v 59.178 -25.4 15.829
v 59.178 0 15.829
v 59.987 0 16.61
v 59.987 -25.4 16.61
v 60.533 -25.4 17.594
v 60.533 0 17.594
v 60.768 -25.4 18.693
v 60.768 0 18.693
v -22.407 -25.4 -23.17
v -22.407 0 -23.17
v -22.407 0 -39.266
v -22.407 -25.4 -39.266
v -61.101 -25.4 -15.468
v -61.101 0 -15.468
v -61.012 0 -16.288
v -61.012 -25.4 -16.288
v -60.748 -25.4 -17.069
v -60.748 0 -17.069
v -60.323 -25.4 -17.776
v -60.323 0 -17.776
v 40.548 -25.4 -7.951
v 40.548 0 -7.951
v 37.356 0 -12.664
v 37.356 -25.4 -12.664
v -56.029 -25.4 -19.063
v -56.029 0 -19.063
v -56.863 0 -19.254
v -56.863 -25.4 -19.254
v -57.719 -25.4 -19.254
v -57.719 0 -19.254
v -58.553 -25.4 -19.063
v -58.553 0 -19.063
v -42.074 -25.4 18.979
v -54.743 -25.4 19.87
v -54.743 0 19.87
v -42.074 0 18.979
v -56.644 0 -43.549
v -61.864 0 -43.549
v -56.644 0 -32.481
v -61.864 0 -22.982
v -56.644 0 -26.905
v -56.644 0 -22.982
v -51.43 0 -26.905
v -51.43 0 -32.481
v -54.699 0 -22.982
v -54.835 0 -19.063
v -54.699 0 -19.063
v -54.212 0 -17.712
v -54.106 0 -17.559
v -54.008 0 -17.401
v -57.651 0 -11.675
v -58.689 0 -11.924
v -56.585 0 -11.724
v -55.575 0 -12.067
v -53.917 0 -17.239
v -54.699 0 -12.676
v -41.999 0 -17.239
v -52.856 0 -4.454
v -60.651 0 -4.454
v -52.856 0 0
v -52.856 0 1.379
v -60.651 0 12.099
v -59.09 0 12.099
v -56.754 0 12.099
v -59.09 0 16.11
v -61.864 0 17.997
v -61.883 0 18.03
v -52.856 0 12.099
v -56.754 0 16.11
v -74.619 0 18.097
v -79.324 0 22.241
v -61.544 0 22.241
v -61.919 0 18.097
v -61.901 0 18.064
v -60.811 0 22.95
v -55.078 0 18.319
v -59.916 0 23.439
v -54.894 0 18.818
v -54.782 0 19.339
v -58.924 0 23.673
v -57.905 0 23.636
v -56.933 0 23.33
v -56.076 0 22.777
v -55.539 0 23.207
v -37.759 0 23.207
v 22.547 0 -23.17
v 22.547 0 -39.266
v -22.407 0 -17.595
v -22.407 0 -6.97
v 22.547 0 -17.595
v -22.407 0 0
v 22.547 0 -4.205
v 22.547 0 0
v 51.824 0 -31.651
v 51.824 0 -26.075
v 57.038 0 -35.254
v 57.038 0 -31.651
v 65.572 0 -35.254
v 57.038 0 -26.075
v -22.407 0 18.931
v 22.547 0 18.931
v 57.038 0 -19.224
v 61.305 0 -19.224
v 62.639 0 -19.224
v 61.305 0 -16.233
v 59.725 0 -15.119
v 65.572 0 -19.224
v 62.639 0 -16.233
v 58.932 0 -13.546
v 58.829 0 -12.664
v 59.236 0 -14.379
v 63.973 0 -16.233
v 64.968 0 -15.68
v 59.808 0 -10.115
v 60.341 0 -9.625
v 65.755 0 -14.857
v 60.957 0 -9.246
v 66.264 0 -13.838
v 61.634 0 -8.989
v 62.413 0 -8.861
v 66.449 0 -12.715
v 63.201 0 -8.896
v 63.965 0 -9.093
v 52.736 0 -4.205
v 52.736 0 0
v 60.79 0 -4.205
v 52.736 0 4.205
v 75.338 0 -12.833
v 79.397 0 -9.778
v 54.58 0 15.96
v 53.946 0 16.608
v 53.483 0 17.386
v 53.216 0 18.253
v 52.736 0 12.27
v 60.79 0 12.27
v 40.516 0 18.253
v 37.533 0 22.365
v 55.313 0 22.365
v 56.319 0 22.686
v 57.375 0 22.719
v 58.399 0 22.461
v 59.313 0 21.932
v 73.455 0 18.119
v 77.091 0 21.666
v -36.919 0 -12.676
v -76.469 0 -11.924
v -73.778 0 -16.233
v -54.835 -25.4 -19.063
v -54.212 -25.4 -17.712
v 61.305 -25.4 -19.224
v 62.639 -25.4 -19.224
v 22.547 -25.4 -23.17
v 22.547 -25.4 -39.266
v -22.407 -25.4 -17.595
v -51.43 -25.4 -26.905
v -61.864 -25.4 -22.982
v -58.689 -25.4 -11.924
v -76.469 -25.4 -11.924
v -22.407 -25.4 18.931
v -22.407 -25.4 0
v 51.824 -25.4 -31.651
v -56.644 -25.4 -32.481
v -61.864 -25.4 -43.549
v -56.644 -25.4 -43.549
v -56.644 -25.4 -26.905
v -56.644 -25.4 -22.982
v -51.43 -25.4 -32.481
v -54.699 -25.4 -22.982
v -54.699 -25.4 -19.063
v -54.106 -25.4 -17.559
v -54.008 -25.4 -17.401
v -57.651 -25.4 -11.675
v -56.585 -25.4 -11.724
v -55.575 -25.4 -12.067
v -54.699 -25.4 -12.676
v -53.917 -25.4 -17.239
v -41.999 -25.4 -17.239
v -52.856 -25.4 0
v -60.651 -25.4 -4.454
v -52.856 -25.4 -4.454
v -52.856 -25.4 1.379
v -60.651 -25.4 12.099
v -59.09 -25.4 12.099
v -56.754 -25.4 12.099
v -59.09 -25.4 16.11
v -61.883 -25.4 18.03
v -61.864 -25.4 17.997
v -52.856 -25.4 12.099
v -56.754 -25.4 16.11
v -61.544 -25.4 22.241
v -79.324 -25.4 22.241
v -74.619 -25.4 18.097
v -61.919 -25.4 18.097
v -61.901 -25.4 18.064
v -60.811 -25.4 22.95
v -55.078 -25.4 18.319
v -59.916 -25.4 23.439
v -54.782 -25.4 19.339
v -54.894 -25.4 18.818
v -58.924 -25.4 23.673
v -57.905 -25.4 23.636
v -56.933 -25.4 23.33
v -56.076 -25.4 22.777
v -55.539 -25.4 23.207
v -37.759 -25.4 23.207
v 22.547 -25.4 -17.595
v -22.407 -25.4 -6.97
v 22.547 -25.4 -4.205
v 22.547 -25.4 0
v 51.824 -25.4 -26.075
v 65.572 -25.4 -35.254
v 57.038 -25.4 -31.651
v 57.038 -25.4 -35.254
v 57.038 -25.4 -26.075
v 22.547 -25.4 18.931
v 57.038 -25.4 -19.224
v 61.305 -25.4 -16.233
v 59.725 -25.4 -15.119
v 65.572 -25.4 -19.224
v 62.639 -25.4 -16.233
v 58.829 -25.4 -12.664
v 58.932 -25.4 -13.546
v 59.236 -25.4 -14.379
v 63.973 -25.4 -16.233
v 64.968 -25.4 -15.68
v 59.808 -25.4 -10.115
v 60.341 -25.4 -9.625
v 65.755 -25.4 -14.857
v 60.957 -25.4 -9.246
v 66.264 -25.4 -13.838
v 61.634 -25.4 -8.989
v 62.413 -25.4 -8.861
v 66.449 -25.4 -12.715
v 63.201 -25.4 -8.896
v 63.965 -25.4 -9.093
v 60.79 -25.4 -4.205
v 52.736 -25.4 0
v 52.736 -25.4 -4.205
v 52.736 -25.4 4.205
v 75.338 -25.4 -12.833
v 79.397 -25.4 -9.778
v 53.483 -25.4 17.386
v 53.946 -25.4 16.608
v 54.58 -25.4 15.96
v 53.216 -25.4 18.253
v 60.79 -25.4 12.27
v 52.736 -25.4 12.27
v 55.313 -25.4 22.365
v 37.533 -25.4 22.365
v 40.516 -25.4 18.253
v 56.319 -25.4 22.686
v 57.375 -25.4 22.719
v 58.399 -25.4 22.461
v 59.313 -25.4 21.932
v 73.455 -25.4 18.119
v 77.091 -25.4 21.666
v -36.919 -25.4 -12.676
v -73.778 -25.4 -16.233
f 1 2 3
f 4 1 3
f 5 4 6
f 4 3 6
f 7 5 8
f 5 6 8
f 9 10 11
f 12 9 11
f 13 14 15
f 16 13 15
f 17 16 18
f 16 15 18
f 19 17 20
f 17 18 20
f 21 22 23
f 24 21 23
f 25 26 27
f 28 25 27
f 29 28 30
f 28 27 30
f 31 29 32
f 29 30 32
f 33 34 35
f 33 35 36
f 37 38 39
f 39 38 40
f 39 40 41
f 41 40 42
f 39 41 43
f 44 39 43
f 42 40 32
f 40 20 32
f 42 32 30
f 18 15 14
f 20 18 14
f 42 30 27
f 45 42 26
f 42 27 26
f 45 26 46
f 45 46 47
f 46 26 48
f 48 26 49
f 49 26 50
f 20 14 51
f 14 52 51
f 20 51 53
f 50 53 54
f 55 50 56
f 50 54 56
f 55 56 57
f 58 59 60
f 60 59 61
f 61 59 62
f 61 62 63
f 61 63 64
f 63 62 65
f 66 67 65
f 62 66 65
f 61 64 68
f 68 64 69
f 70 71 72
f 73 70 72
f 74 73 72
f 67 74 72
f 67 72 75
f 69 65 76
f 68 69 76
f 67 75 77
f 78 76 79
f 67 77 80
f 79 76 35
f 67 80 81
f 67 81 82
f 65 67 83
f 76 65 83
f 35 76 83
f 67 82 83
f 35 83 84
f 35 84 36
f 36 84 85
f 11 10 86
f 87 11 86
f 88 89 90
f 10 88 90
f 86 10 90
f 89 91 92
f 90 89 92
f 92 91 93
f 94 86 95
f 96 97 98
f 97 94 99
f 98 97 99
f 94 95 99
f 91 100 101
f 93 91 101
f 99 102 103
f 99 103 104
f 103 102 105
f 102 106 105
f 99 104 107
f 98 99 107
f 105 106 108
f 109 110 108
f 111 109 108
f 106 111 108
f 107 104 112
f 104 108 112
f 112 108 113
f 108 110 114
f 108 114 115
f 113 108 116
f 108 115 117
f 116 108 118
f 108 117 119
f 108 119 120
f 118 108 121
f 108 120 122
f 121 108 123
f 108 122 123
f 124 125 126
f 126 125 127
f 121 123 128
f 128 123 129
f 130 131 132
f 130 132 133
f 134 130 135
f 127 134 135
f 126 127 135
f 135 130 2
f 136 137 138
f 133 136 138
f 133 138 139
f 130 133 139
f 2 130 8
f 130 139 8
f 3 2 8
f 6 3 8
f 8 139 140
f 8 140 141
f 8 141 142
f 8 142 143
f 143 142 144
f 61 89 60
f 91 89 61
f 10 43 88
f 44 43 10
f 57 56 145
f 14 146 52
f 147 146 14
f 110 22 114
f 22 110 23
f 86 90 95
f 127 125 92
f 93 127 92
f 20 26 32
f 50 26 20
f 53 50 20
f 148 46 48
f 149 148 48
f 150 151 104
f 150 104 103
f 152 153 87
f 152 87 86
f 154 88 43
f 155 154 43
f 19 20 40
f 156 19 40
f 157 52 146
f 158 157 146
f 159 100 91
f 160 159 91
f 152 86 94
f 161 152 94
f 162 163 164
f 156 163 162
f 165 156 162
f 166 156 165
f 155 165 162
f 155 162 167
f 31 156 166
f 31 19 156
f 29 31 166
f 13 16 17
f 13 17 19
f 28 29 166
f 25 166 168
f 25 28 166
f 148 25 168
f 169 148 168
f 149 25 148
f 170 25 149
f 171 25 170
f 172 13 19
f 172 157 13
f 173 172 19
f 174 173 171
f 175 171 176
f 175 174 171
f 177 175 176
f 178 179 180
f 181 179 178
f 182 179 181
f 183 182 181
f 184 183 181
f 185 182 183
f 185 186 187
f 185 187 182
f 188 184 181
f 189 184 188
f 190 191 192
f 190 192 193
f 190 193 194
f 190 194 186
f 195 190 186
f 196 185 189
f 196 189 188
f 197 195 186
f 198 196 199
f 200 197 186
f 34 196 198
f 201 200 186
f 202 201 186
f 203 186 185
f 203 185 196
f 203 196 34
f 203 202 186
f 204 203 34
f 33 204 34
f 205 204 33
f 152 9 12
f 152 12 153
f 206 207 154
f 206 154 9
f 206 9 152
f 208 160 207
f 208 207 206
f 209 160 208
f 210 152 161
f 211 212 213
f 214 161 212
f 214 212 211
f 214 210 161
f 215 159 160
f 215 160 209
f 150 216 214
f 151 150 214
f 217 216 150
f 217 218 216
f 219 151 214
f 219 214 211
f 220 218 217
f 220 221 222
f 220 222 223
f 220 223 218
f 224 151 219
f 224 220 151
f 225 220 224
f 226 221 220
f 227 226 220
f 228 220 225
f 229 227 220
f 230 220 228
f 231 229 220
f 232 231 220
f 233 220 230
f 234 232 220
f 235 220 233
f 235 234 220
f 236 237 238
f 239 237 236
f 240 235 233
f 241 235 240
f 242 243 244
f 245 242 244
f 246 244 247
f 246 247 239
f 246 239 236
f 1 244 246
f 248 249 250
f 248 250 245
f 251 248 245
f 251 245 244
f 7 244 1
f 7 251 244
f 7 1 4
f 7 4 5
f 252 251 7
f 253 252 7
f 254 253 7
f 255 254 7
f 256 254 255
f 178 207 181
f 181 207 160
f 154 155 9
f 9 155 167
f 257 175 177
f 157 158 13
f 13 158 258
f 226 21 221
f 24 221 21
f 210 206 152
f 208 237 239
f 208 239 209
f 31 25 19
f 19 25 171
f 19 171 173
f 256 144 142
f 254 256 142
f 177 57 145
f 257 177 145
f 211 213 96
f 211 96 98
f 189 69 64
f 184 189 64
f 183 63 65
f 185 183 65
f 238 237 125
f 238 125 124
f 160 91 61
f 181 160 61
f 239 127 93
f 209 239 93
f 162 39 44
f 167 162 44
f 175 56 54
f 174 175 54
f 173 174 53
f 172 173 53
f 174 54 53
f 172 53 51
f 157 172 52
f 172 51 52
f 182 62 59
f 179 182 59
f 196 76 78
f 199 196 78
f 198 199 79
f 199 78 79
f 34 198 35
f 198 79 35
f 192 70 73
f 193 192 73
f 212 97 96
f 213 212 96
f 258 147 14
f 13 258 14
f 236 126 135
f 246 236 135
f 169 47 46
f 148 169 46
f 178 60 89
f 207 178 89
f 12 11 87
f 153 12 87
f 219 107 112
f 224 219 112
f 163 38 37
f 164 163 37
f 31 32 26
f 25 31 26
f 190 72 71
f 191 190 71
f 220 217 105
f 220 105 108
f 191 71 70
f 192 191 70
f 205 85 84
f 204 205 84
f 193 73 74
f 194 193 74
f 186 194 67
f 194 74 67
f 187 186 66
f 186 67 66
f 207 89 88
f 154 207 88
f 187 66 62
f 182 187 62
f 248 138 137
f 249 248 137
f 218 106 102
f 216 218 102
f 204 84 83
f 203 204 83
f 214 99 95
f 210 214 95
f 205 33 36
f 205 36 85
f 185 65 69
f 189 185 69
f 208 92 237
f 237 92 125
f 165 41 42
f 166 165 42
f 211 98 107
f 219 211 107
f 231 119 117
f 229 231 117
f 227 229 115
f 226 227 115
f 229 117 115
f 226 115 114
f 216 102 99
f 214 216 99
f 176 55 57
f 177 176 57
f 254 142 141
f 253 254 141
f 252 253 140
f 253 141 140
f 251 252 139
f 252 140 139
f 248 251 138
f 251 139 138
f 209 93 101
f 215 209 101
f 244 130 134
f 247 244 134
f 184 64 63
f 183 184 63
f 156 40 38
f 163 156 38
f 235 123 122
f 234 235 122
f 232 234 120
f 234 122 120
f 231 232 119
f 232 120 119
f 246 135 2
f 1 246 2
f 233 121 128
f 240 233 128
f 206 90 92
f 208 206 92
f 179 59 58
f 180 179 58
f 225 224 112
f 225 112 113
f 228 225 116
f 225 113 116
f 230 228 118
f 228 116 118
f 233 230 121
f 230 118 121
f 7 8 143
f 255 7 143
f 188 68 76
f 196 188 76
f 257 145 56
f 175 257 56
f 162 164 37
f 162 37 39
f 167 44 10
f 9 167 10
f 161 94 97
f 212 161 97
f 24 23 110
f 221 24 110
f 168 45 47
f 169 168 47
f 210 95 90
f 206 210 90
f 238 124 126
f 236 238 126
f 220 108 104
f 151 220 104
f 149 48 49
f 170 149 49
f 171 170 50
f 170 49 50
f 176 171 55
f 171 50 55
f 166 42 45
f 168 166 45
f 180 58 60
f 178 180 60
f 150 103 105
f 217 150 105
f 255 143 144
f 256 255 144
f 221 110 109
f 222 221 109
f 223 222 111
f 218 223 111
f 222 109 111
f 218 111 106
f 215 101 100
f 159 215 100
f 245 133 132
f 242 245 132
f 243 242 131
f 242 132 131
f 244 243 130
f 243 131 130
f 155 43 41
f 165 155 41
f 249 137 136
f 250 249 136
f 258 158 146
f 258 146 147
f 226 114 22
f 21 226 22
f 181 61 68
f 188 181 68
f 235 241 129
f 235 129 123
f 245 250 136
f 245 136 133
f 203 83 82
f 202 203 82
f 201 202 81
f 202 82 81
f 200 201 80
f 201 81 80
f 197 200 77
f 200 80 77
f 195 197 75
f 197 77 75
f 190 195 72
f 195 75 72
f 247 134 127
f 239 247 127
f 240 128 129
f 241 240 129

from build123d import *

# Parameters (mm, degrees)
F1_DEPTH = 25.4


with BuildPart() as f1:
    # F0 (on Front) → F1 (new body)
    with BuildSketch(Plane.XZ):
        Polygon((22.5474490715, 18.9312816523), (-22.4071055408, 18.9312816523), (-22.4071055408, 0), (-22.4071055408, -6.9696964332), (-22.4071055408, -17.594622799), (-22.4071055408, -23.1704941269), (-22.4071055408, -39.2656994748), (22.5474490715, -39.2656994748), (22.5474490715, -23.1704941269), (22.5474490715, -17.594622799), (22.5474490715, -4.2047654179), (22.5474490715, 0), align=None)
        Polygon((-22.4071055408, -6.9696964332), (-22.4071055408, 0), (-52.8559159213, 1.3785305276), (-52.8559159213, 12.0989607125), (-56.7535475108, 12.0989607125), (-59.089986937, 12.0989607125), (-60.6511791004, 12.0989607125), (-60.6511791004, 1.3785305276), (-60.6511791004, -4.4540729796), (-52.8559159213, -4.4540729796), (-52.8559159213, 0), align=None)
        Polygon((52.7360288291, 4.2047654179), (22.5474490715, 0), (22.5474490715, -4.2047654179), (52.7360288291, 0), (52.7360288291, -4.2047654179), (60.7895958687, -4.2047654179), (60.7895958687, 12.2697306797), (59.0926311994, 12.2697306797), (56.7628123489, 12.2697306797), (52.7360288291, 12.2697306797), align=None)
        Polygon((-22.4071055408, -23.1704941269), (-22.4071055408, -17.594622799), (-51.4301823175, -26.9054452341), (-56.6440403175, -26.9054452341), (-56.6440403175, -22.9819128912), (-58.5528229446, -22.9819128912), (-61.8640467567, -22.9819128912), (-61.8640467567, -43.5494654834), (-56.6440403175, -43.5494654834), (-56.6440403175, -32.481316562), (-51.4301823175, -32.481316562), align=None)
        with BuildLine():
            Line((-56.7535475108, 12.0989607125), (-52.8559159213, 12.0989607125))
            Line((-52.8559159213, 12.0989607125), (-55.078114397, 18.3186511549))
            ThreePointArc((-55.078114397, 18.3186511549), (-56.262887732, 16.8364566613), (-58.0156589521, 16.1095581661))
            Line((-58.0156589521, 16.1095581661), (-56.7535475108, 16.1095581661))
            Line((-56.7535475108, 16.1095581661), (-56.7535475108, 12.0989607125))
        make_face()
        Polygon((51.8240314995, -26.0747242923), (22.5474490715, -17.594622799), (22.5474490715, -23.1704941269), (51.8240314995, -31.6505956202), (57.037895267, -31.6505956202), (57.037895267, -35.2540606945), (65.5718660751, -35.2540606945), (65.5718660751, -19.2238938555), (62.6388617216, -19.2238938555), (61.3048806711, -19.2238938555), (57.037895267, -19.2238938555), (57.037895267, -26.0747242923), align=None)
        with BuildLine():
            Line((54.5799710571, 15.960324229), (52.7360288291, 12.2697306797))
            Line((52.7360288291, 12.2697306797), (56.7628123489, 12.2697306797))
            Line((56.7628123489, 12.2697306797), (59.0926311994, 12.2697306797))
            Line((59.0926311994, 12.2697306797), (60.7895958687, 12.2697306797))
            Line((60.7895958687, 12.2697306797), (59.1775793711, 15.8294018559))
            ThreePointArc((59.1775793711, 15.8294018559), (56.8567905245, 15.1228254655), (54.5799710571, 15.960324229))
        make_face()
        with BuildLine():
            Line((-54.7428394485, 19.8702869995), (-55.078114397, 18.3186511549))
            ThreePointArc((-55.078114397, 18.3186511549), (-54.8287689719, 19.0768137561), (-54.7428394485, 19.8702869995))
        make_face()
        with BuildLine():
            ThreePointArc((-58.0156589521, 16.1095581661), (-56.262887732, 16.8364566613), (-55.078114397, 18.3186511549))
            Line((-55.078114397, 18.3186511549), (-54.7428394485, 19.8702869995))
            ThreePointArc((-54.7428394485, 19.8702869995), (-54.7428270706, 19.8758941331), (-54.7428229446, 19.8815012788))
            ThreePointArc((-54.7428229446, 19.8815012788), (-55.0921436229, 21.4751758479), (-56.0760505732, 22.7766176184))
            Line((-56.0760505732, 22.7766176184), (-61.919152939, 18.0971463901))
            ThreePointArc((-61.919152939, 18.0971463901), (-61.8919764107, 18.0467930924), (-61.8640467567, 17.9968536019))
            ThreePointArc((-61.8640467567, 17.9968536019), (-60.6959499098, 16.7314049611), (-59.089986937, 16.1095581661))
            Line((-59.089986937, 16.1095581661), (-58.0156589521, 16.1095581661))
        make_face()
        with BuildLine():
            ThreePointArc((53.2161910443, 18.2525139833), (53.6909466204, 16.983180707), (54.5799710571, 15.960324229))
            ThreePointArc((54.5799710571, 15.960324229), (56.8567905245, 15.1228254655), (59.1775793711, 15.8294018559))
            ThreePointArc((59.1775793711, 15.8294018559), (60.2962294962, 17.0817912782), (60.7678109959, 18.6934575763))
            ThreePointArc((60.7678109959, 18.6934575763), (60.7733829341, 18.8123115995), (60.7752408508, 18.9312816523))
            ThreePointArc((60.7752408508, 18.9312816523), (60.3902565943, 20.6002235797), (59.3131058603, 21.9318865742))
            ThreePointArc((59.3131058603, 21.9318865742), (57.3749391018, 22.7191896954), (55.3132558722, 22.3645083606))
            ThreePointArc((55.3132558722, 22.3645083606), (53.5711402885, 20.6622297662), (53.2161910443, 18.2525139833))
        make_face()
        with BuildLine():
            Line((-60.6511791004, 12.0989607125), (-59.089986937, 12.0989607125))
            Line((-59.089986937, 12.0989607125), (-59.089986937, 16.1095581661))
            ThreePointArc((-59.089986937, 16.1095581661), (-60.6959499098, 16.7314049611), (-61.8640467567, 17.9968536019))
            Line((-61.8640467567, 17.9968536019), (-60.6511791004, 12.0989607125))
        make_face()
        with BuildLine():
            ThreePointArc((-54.7428229446, 19.8815012788), (-54.7428270706, 19.8758941331), (-54.7428394485, 19.8702869995))
            Line((-54.7428394485, 19.8702869995), (-42.0741718651, 18.9787368555))
            Line((-42.0741718651, 18.9787368555), (-37.7587572973, 23.2069110257))
            Line((-37.7587572973, 23.2069110257), (-55.5387572973, 23.2069110257))
            Line((-55.5387572973, 23.2069110257), (-56.0760505732, 22.7766176184))
            ThreePointArc((-56.0760505732, 22.7766176184), (-55.0921436229, 21.4751758479), (-54.7428229446, 19.8815012788))
        make_face()
        with BuildLine():
            Line((40.5161910443, 18.2525139833), (53.2161910443, 18.2525139833))
            ThreePointArc((53.2161910443, 18.2525139833), (53.5711402885, 20.6622297662), (55.3132558722, 22.3645083606))
            Line((55.3132558722, 22.3645083606), (37.5332558722, 22.3645083606))
            Line((37.5332558722, 22.3645083606), (40.5161910443, 18.2525139833))
        make_face()
        Polygon((-54.8352957317, -19.0630764722), (-56.6440403175, -22.9819128912), (-54.6986439291, -22.9819128912), (-54.6986439291, -19.0630764722), align=None)
        with BuildLine():
            Line((-58.5528229446, -22.9819128912), (-56.6440403175, -22.9819128912))
            Line((-56.6440403175, -22.9819128912), (-54.8352957317, -19.0630764722))
            Line((-54.8352957317, -19.0630764722), (-56.0289748879, -19.0630764722))
            ThreePointArc((-56.0289748879, -19.0630764722), (-57.2908989162, -19.2781289417), (-58.5528229446, -19.0630764722))
            Line((-58.5528229446, -19.0630764722), (-58.5528229446, -22.9819128912))
        make_face()
        with BuildLine():
            Line((59.7251296844, -15.1193431804), (57.037895267, -19.2238938555))
            Line((57.037895267, -19.2238938555), (61.3048806711, -19.2238938555))
            Line((61.3048806711, -19.2238938555), (61.3048806711, -16.2333344292))
            ThreePointArc((61.3048806711, -16.2333344292), (60.4431817029, -15.7781916743), (59.7251296844, -15.1193431804))
        make_face()
        with BuildLine():
            ThreePointArc((60.7752408508, 18.9312816523), (60.7733829341, 18.8123115995), (60.7678109959, 18.6934575763))
            Line((60.7678109959, 18.6934575763), (73.4548153211, 18.1190698564))
            Line((73.4548153211, 18.1190698564), (77.0911238889, 21.6664153429))
            Line((77.0911238889, 21.6664153429), (59.3131058603, 21.9318865742))
            ThreePointArc((59.3131058603, 21.9318865742), (60.3902565943, 20.6002235797), (60.7752408508, 18.9312816523))
        make_face()
        with BuildLine():
            Line((-61.8640467567, -22.9819128912), (-58.5528229446, -22.9819128912))
            Line((-58.5528229446, -22.9819128912), (-58.5528229446, -19.0630764722))
            ThreePointArc((-58.5528229446, -19.0630764722), (-59.5321043266, -18.5492161376), (-60.3225544192, -17.7757608255))
            Line((-60.3225544192, -17.7757608255), (-61.8640467567, -22.9819128912))
        make_face()
        with BuildLine():
            Line((-56.0289748879, -19.0630764722), (-54.8352957317, -19.0630764722))
            Line((-54.8352957317, -19.0630764722), (-54.211621416, -17.7118201141))
            ThreePointArc((-54.211621416, -17.7118201141), (-55.0175795119, -18.5255983015), (-56.0289748879, -19.0630764722))
        make_face()
        with BuildLine():
            Line((-61.919152939, 18.0971463901), (-56.0760505732, 22.7766176184))
            ThreePointArc((-56.0760505732, 22.7766176184), (-58.9240512759, 23.6733727858), (-61.5440566002, 22.2412939005))
            ThreePointArc((-61.5440566002, 22.2412939005), (-62.3473115185, 20.2249491816), (-61.919152939, 18.0971463901))
        make_face()
        with BuildLine():
            ThreePointArc((58.8288617216, -12.6644978461), (59.0599359706, -13.9711693691), (59.7251296844, -15.1193431804))
            ThreePointArc((59.7251296844, -15.1193431804), (60.4431817029, -15.7781916743), (61.3048806711, -16.2333344292))
            Line((61.3048806711, -16.2333344292), (62.6388617216, -16.2333344292))
            Line((62.6388617216, -16.2333344292), (62.6388617216, -16.4744978461))
            ThreePointArc((62.6388617216, -16.4744978461), (63.3166642807, -16.413722258), (63.972842772, -16.2333344292))
            ThreePointArc((63.972842772, -16.2333344292), (65.7548069155, -14.8569817226), (66.4485282611, -12.7149047688))
            ThreePointArc((66.4485282611, -12.7149047688), (66.4487783555, -12.6897018589), (66.4488617216, -12.6644978461))
            ThreePointArc((66.4488617216, -12.6644978461), (65.7668954697, -10.4892955864), (63.9651321307, -9.0927886191))
            Line((63.9651321307, -9.0927886191), (61.6344029934, -8.9892886461))
            ThreePointArc((61.6344029934, -8.9892886461), (60.6402483125, -9.4207894065), (59.8078067825, -10.1147472834))
            ThreePointArc((59.8078067825, -10.1147472834), (59.0820078225, -11.2988879673), (58.8288617216, -12.6644978461))
        make_face()
        with BuildLine():
            ThreePointArc((-60.3225544192, -17.7757608255), (-59.5321043266, -18.5492161376), (-58.5528229446, -19.0630764722))
            Line((-58.5528229446, -19.0630764722), (-56.0289748879, -19.0630764722))
            ThreePointArc((-56.0289748879, -19.0630764722), (-55.0175795119, -18.5255983015), (-54.211621416, -17.7118201141))
            ThreePointArc((-54.211621416, -17.7118201141), (-54.0557588566, -17.4805823684), (-53.9172272287, -17.2385637315))
            ThreePointArc((-53.9172272287, -17.2385637315), (-53.5915889042, -16.3798336282), (-53.4808989162, -15.4681289417))
            ThreePointArc((-53.4808989162, -15.4681289417), (-53.7985793789, -13.9450385801), (-54.6986439291, -12.6759408961))
            ThreePointArc((-54.6986439291, -12.6759408961), (-56.5853171419, -11.7240330082), (-58.689052199, -11.9239411084))
            ThreePointArc((-58.689052199, -11.9239411084), (-60.4407452623, -13.3246345992), (-61.1008989162, -15.4681289417))
            ThreePointArc((-61.1008989162, -15.4681289417), (-60.9010725593, -16.6858096334), (-60.3225544192, -17.7757608255))
        make_face()
        with BuildLine():
            Line((-74.619152939, 18.0971463901), (-61.919152939, 18.0971463901))
            ThreePointArc((-61.919152939, 18.0971463901), (-62.3473115185, 20.2249491816), (-61.5440566002, 22.2412939005))
            Line((-61.5440566002, 22.2412939005), (-79.3240566002, 22.2412939005))
            Line((-79.3240566002, 22.2412939005), (-74.619152939, 18.0971463901))
        make_face()
        with BuildLine():
            Line((62.6388617216, -16.4744978461), (62.6388617216, -19.2238938555))
            Line((62.6388617216, -19.2238938555), (65.5718660751, -19.2238938555))
            Line((65.5718660751, -19.2238938555), (63.972842772, -16.2333344292))
            ThreePointArc((63.972842772, -16.2333344292), (63.3166642807, -16.413722258), (62.6388617216, -16.4744978461))
        make_face()
        with BuildLine():
            Line((37.3561628626, -12.6644978461), (58.8288617216, -12.6644978461))
            ThreePointArc((58.8288617216, -12.6644978461), (59.0820078225, -11.2988879673), (59.8078067825, -10.1147472834))
            Line((59.8078067825, -10.1147472834), (40.5480005181, -7.951349779))
            Line((40.5480005181, -7.951349779), (37.3561628626, -12.6644978461))
        make_face()
        with BuildLine():
            ThreePointArc((-53.4808989162, -15.4681289417), (-53.5915889042, -16.3798336282), (-53.9172272287, -17.2385637315))
            Line((-53.9172272287, -17.2385637315), (-41.9986439291, -17.2385637315))
            Line((-41.9986439291, -17.2385637315), (-36.9186439291, -12.6759408961))
            Line((-36.9186439291, -12.6759408961), (-54.6986439291, -12.6759408961))
            ThreePointArc((-54.6986439291, -12.6759408961), (-53.7985793789, -13.9450385801), (-53.4808989162, -15.4681289417))
        make_face()
        with BuildLine():
            Line((-73.7778736162, -16.2325322744), (-61.1008989162, -15.4681289417))
            ThreePointArc((-61.1008989162, -15.4681289417), (-60.4407452623, -13.3246345992), (-58.689052199, -11.9239411084))
            Line((-58.689052199, -11.9239411084), (-76.469052199, -11.9239411084))
            Line((-76.469052199, -11.9239411084), (-73.7778736162, -16.2325322744))
        make_face()
        with BuildLine():
            ThreePointArc((63.9651321307, -9.0927886191), (62.8078846508, -8.8582488724), (61.6344029934, -8.9892886461))
            Line((61.6344029934, -8.9892886461), (63.9651321307, -9.0927886191))
        make_face()
        with BuildLine():
            ThreePointArc((66.4488617216, -12.6644978461), (66.4487783555, -12.6897018589), (66.4485282611, -12.7149047688))
            Line((66.4485282611, -12.7149047688), (75.3377501865, -12.8325209217))
            Line((75.3377501865, -12.8325209217), (79.3968982037, -9.7780623159))
            Line((79.3968982037, -9.7780623159), (63.9651321307, -9.0927886191))
            ThreePointArc((63.9651321307, -9.0927886191), (65.7668954697, -10.4892955864), (66.4488617216, -12.6644978461))
        make_face()
    extrude(amount=F1_DEPTH)


solid = f1.part
